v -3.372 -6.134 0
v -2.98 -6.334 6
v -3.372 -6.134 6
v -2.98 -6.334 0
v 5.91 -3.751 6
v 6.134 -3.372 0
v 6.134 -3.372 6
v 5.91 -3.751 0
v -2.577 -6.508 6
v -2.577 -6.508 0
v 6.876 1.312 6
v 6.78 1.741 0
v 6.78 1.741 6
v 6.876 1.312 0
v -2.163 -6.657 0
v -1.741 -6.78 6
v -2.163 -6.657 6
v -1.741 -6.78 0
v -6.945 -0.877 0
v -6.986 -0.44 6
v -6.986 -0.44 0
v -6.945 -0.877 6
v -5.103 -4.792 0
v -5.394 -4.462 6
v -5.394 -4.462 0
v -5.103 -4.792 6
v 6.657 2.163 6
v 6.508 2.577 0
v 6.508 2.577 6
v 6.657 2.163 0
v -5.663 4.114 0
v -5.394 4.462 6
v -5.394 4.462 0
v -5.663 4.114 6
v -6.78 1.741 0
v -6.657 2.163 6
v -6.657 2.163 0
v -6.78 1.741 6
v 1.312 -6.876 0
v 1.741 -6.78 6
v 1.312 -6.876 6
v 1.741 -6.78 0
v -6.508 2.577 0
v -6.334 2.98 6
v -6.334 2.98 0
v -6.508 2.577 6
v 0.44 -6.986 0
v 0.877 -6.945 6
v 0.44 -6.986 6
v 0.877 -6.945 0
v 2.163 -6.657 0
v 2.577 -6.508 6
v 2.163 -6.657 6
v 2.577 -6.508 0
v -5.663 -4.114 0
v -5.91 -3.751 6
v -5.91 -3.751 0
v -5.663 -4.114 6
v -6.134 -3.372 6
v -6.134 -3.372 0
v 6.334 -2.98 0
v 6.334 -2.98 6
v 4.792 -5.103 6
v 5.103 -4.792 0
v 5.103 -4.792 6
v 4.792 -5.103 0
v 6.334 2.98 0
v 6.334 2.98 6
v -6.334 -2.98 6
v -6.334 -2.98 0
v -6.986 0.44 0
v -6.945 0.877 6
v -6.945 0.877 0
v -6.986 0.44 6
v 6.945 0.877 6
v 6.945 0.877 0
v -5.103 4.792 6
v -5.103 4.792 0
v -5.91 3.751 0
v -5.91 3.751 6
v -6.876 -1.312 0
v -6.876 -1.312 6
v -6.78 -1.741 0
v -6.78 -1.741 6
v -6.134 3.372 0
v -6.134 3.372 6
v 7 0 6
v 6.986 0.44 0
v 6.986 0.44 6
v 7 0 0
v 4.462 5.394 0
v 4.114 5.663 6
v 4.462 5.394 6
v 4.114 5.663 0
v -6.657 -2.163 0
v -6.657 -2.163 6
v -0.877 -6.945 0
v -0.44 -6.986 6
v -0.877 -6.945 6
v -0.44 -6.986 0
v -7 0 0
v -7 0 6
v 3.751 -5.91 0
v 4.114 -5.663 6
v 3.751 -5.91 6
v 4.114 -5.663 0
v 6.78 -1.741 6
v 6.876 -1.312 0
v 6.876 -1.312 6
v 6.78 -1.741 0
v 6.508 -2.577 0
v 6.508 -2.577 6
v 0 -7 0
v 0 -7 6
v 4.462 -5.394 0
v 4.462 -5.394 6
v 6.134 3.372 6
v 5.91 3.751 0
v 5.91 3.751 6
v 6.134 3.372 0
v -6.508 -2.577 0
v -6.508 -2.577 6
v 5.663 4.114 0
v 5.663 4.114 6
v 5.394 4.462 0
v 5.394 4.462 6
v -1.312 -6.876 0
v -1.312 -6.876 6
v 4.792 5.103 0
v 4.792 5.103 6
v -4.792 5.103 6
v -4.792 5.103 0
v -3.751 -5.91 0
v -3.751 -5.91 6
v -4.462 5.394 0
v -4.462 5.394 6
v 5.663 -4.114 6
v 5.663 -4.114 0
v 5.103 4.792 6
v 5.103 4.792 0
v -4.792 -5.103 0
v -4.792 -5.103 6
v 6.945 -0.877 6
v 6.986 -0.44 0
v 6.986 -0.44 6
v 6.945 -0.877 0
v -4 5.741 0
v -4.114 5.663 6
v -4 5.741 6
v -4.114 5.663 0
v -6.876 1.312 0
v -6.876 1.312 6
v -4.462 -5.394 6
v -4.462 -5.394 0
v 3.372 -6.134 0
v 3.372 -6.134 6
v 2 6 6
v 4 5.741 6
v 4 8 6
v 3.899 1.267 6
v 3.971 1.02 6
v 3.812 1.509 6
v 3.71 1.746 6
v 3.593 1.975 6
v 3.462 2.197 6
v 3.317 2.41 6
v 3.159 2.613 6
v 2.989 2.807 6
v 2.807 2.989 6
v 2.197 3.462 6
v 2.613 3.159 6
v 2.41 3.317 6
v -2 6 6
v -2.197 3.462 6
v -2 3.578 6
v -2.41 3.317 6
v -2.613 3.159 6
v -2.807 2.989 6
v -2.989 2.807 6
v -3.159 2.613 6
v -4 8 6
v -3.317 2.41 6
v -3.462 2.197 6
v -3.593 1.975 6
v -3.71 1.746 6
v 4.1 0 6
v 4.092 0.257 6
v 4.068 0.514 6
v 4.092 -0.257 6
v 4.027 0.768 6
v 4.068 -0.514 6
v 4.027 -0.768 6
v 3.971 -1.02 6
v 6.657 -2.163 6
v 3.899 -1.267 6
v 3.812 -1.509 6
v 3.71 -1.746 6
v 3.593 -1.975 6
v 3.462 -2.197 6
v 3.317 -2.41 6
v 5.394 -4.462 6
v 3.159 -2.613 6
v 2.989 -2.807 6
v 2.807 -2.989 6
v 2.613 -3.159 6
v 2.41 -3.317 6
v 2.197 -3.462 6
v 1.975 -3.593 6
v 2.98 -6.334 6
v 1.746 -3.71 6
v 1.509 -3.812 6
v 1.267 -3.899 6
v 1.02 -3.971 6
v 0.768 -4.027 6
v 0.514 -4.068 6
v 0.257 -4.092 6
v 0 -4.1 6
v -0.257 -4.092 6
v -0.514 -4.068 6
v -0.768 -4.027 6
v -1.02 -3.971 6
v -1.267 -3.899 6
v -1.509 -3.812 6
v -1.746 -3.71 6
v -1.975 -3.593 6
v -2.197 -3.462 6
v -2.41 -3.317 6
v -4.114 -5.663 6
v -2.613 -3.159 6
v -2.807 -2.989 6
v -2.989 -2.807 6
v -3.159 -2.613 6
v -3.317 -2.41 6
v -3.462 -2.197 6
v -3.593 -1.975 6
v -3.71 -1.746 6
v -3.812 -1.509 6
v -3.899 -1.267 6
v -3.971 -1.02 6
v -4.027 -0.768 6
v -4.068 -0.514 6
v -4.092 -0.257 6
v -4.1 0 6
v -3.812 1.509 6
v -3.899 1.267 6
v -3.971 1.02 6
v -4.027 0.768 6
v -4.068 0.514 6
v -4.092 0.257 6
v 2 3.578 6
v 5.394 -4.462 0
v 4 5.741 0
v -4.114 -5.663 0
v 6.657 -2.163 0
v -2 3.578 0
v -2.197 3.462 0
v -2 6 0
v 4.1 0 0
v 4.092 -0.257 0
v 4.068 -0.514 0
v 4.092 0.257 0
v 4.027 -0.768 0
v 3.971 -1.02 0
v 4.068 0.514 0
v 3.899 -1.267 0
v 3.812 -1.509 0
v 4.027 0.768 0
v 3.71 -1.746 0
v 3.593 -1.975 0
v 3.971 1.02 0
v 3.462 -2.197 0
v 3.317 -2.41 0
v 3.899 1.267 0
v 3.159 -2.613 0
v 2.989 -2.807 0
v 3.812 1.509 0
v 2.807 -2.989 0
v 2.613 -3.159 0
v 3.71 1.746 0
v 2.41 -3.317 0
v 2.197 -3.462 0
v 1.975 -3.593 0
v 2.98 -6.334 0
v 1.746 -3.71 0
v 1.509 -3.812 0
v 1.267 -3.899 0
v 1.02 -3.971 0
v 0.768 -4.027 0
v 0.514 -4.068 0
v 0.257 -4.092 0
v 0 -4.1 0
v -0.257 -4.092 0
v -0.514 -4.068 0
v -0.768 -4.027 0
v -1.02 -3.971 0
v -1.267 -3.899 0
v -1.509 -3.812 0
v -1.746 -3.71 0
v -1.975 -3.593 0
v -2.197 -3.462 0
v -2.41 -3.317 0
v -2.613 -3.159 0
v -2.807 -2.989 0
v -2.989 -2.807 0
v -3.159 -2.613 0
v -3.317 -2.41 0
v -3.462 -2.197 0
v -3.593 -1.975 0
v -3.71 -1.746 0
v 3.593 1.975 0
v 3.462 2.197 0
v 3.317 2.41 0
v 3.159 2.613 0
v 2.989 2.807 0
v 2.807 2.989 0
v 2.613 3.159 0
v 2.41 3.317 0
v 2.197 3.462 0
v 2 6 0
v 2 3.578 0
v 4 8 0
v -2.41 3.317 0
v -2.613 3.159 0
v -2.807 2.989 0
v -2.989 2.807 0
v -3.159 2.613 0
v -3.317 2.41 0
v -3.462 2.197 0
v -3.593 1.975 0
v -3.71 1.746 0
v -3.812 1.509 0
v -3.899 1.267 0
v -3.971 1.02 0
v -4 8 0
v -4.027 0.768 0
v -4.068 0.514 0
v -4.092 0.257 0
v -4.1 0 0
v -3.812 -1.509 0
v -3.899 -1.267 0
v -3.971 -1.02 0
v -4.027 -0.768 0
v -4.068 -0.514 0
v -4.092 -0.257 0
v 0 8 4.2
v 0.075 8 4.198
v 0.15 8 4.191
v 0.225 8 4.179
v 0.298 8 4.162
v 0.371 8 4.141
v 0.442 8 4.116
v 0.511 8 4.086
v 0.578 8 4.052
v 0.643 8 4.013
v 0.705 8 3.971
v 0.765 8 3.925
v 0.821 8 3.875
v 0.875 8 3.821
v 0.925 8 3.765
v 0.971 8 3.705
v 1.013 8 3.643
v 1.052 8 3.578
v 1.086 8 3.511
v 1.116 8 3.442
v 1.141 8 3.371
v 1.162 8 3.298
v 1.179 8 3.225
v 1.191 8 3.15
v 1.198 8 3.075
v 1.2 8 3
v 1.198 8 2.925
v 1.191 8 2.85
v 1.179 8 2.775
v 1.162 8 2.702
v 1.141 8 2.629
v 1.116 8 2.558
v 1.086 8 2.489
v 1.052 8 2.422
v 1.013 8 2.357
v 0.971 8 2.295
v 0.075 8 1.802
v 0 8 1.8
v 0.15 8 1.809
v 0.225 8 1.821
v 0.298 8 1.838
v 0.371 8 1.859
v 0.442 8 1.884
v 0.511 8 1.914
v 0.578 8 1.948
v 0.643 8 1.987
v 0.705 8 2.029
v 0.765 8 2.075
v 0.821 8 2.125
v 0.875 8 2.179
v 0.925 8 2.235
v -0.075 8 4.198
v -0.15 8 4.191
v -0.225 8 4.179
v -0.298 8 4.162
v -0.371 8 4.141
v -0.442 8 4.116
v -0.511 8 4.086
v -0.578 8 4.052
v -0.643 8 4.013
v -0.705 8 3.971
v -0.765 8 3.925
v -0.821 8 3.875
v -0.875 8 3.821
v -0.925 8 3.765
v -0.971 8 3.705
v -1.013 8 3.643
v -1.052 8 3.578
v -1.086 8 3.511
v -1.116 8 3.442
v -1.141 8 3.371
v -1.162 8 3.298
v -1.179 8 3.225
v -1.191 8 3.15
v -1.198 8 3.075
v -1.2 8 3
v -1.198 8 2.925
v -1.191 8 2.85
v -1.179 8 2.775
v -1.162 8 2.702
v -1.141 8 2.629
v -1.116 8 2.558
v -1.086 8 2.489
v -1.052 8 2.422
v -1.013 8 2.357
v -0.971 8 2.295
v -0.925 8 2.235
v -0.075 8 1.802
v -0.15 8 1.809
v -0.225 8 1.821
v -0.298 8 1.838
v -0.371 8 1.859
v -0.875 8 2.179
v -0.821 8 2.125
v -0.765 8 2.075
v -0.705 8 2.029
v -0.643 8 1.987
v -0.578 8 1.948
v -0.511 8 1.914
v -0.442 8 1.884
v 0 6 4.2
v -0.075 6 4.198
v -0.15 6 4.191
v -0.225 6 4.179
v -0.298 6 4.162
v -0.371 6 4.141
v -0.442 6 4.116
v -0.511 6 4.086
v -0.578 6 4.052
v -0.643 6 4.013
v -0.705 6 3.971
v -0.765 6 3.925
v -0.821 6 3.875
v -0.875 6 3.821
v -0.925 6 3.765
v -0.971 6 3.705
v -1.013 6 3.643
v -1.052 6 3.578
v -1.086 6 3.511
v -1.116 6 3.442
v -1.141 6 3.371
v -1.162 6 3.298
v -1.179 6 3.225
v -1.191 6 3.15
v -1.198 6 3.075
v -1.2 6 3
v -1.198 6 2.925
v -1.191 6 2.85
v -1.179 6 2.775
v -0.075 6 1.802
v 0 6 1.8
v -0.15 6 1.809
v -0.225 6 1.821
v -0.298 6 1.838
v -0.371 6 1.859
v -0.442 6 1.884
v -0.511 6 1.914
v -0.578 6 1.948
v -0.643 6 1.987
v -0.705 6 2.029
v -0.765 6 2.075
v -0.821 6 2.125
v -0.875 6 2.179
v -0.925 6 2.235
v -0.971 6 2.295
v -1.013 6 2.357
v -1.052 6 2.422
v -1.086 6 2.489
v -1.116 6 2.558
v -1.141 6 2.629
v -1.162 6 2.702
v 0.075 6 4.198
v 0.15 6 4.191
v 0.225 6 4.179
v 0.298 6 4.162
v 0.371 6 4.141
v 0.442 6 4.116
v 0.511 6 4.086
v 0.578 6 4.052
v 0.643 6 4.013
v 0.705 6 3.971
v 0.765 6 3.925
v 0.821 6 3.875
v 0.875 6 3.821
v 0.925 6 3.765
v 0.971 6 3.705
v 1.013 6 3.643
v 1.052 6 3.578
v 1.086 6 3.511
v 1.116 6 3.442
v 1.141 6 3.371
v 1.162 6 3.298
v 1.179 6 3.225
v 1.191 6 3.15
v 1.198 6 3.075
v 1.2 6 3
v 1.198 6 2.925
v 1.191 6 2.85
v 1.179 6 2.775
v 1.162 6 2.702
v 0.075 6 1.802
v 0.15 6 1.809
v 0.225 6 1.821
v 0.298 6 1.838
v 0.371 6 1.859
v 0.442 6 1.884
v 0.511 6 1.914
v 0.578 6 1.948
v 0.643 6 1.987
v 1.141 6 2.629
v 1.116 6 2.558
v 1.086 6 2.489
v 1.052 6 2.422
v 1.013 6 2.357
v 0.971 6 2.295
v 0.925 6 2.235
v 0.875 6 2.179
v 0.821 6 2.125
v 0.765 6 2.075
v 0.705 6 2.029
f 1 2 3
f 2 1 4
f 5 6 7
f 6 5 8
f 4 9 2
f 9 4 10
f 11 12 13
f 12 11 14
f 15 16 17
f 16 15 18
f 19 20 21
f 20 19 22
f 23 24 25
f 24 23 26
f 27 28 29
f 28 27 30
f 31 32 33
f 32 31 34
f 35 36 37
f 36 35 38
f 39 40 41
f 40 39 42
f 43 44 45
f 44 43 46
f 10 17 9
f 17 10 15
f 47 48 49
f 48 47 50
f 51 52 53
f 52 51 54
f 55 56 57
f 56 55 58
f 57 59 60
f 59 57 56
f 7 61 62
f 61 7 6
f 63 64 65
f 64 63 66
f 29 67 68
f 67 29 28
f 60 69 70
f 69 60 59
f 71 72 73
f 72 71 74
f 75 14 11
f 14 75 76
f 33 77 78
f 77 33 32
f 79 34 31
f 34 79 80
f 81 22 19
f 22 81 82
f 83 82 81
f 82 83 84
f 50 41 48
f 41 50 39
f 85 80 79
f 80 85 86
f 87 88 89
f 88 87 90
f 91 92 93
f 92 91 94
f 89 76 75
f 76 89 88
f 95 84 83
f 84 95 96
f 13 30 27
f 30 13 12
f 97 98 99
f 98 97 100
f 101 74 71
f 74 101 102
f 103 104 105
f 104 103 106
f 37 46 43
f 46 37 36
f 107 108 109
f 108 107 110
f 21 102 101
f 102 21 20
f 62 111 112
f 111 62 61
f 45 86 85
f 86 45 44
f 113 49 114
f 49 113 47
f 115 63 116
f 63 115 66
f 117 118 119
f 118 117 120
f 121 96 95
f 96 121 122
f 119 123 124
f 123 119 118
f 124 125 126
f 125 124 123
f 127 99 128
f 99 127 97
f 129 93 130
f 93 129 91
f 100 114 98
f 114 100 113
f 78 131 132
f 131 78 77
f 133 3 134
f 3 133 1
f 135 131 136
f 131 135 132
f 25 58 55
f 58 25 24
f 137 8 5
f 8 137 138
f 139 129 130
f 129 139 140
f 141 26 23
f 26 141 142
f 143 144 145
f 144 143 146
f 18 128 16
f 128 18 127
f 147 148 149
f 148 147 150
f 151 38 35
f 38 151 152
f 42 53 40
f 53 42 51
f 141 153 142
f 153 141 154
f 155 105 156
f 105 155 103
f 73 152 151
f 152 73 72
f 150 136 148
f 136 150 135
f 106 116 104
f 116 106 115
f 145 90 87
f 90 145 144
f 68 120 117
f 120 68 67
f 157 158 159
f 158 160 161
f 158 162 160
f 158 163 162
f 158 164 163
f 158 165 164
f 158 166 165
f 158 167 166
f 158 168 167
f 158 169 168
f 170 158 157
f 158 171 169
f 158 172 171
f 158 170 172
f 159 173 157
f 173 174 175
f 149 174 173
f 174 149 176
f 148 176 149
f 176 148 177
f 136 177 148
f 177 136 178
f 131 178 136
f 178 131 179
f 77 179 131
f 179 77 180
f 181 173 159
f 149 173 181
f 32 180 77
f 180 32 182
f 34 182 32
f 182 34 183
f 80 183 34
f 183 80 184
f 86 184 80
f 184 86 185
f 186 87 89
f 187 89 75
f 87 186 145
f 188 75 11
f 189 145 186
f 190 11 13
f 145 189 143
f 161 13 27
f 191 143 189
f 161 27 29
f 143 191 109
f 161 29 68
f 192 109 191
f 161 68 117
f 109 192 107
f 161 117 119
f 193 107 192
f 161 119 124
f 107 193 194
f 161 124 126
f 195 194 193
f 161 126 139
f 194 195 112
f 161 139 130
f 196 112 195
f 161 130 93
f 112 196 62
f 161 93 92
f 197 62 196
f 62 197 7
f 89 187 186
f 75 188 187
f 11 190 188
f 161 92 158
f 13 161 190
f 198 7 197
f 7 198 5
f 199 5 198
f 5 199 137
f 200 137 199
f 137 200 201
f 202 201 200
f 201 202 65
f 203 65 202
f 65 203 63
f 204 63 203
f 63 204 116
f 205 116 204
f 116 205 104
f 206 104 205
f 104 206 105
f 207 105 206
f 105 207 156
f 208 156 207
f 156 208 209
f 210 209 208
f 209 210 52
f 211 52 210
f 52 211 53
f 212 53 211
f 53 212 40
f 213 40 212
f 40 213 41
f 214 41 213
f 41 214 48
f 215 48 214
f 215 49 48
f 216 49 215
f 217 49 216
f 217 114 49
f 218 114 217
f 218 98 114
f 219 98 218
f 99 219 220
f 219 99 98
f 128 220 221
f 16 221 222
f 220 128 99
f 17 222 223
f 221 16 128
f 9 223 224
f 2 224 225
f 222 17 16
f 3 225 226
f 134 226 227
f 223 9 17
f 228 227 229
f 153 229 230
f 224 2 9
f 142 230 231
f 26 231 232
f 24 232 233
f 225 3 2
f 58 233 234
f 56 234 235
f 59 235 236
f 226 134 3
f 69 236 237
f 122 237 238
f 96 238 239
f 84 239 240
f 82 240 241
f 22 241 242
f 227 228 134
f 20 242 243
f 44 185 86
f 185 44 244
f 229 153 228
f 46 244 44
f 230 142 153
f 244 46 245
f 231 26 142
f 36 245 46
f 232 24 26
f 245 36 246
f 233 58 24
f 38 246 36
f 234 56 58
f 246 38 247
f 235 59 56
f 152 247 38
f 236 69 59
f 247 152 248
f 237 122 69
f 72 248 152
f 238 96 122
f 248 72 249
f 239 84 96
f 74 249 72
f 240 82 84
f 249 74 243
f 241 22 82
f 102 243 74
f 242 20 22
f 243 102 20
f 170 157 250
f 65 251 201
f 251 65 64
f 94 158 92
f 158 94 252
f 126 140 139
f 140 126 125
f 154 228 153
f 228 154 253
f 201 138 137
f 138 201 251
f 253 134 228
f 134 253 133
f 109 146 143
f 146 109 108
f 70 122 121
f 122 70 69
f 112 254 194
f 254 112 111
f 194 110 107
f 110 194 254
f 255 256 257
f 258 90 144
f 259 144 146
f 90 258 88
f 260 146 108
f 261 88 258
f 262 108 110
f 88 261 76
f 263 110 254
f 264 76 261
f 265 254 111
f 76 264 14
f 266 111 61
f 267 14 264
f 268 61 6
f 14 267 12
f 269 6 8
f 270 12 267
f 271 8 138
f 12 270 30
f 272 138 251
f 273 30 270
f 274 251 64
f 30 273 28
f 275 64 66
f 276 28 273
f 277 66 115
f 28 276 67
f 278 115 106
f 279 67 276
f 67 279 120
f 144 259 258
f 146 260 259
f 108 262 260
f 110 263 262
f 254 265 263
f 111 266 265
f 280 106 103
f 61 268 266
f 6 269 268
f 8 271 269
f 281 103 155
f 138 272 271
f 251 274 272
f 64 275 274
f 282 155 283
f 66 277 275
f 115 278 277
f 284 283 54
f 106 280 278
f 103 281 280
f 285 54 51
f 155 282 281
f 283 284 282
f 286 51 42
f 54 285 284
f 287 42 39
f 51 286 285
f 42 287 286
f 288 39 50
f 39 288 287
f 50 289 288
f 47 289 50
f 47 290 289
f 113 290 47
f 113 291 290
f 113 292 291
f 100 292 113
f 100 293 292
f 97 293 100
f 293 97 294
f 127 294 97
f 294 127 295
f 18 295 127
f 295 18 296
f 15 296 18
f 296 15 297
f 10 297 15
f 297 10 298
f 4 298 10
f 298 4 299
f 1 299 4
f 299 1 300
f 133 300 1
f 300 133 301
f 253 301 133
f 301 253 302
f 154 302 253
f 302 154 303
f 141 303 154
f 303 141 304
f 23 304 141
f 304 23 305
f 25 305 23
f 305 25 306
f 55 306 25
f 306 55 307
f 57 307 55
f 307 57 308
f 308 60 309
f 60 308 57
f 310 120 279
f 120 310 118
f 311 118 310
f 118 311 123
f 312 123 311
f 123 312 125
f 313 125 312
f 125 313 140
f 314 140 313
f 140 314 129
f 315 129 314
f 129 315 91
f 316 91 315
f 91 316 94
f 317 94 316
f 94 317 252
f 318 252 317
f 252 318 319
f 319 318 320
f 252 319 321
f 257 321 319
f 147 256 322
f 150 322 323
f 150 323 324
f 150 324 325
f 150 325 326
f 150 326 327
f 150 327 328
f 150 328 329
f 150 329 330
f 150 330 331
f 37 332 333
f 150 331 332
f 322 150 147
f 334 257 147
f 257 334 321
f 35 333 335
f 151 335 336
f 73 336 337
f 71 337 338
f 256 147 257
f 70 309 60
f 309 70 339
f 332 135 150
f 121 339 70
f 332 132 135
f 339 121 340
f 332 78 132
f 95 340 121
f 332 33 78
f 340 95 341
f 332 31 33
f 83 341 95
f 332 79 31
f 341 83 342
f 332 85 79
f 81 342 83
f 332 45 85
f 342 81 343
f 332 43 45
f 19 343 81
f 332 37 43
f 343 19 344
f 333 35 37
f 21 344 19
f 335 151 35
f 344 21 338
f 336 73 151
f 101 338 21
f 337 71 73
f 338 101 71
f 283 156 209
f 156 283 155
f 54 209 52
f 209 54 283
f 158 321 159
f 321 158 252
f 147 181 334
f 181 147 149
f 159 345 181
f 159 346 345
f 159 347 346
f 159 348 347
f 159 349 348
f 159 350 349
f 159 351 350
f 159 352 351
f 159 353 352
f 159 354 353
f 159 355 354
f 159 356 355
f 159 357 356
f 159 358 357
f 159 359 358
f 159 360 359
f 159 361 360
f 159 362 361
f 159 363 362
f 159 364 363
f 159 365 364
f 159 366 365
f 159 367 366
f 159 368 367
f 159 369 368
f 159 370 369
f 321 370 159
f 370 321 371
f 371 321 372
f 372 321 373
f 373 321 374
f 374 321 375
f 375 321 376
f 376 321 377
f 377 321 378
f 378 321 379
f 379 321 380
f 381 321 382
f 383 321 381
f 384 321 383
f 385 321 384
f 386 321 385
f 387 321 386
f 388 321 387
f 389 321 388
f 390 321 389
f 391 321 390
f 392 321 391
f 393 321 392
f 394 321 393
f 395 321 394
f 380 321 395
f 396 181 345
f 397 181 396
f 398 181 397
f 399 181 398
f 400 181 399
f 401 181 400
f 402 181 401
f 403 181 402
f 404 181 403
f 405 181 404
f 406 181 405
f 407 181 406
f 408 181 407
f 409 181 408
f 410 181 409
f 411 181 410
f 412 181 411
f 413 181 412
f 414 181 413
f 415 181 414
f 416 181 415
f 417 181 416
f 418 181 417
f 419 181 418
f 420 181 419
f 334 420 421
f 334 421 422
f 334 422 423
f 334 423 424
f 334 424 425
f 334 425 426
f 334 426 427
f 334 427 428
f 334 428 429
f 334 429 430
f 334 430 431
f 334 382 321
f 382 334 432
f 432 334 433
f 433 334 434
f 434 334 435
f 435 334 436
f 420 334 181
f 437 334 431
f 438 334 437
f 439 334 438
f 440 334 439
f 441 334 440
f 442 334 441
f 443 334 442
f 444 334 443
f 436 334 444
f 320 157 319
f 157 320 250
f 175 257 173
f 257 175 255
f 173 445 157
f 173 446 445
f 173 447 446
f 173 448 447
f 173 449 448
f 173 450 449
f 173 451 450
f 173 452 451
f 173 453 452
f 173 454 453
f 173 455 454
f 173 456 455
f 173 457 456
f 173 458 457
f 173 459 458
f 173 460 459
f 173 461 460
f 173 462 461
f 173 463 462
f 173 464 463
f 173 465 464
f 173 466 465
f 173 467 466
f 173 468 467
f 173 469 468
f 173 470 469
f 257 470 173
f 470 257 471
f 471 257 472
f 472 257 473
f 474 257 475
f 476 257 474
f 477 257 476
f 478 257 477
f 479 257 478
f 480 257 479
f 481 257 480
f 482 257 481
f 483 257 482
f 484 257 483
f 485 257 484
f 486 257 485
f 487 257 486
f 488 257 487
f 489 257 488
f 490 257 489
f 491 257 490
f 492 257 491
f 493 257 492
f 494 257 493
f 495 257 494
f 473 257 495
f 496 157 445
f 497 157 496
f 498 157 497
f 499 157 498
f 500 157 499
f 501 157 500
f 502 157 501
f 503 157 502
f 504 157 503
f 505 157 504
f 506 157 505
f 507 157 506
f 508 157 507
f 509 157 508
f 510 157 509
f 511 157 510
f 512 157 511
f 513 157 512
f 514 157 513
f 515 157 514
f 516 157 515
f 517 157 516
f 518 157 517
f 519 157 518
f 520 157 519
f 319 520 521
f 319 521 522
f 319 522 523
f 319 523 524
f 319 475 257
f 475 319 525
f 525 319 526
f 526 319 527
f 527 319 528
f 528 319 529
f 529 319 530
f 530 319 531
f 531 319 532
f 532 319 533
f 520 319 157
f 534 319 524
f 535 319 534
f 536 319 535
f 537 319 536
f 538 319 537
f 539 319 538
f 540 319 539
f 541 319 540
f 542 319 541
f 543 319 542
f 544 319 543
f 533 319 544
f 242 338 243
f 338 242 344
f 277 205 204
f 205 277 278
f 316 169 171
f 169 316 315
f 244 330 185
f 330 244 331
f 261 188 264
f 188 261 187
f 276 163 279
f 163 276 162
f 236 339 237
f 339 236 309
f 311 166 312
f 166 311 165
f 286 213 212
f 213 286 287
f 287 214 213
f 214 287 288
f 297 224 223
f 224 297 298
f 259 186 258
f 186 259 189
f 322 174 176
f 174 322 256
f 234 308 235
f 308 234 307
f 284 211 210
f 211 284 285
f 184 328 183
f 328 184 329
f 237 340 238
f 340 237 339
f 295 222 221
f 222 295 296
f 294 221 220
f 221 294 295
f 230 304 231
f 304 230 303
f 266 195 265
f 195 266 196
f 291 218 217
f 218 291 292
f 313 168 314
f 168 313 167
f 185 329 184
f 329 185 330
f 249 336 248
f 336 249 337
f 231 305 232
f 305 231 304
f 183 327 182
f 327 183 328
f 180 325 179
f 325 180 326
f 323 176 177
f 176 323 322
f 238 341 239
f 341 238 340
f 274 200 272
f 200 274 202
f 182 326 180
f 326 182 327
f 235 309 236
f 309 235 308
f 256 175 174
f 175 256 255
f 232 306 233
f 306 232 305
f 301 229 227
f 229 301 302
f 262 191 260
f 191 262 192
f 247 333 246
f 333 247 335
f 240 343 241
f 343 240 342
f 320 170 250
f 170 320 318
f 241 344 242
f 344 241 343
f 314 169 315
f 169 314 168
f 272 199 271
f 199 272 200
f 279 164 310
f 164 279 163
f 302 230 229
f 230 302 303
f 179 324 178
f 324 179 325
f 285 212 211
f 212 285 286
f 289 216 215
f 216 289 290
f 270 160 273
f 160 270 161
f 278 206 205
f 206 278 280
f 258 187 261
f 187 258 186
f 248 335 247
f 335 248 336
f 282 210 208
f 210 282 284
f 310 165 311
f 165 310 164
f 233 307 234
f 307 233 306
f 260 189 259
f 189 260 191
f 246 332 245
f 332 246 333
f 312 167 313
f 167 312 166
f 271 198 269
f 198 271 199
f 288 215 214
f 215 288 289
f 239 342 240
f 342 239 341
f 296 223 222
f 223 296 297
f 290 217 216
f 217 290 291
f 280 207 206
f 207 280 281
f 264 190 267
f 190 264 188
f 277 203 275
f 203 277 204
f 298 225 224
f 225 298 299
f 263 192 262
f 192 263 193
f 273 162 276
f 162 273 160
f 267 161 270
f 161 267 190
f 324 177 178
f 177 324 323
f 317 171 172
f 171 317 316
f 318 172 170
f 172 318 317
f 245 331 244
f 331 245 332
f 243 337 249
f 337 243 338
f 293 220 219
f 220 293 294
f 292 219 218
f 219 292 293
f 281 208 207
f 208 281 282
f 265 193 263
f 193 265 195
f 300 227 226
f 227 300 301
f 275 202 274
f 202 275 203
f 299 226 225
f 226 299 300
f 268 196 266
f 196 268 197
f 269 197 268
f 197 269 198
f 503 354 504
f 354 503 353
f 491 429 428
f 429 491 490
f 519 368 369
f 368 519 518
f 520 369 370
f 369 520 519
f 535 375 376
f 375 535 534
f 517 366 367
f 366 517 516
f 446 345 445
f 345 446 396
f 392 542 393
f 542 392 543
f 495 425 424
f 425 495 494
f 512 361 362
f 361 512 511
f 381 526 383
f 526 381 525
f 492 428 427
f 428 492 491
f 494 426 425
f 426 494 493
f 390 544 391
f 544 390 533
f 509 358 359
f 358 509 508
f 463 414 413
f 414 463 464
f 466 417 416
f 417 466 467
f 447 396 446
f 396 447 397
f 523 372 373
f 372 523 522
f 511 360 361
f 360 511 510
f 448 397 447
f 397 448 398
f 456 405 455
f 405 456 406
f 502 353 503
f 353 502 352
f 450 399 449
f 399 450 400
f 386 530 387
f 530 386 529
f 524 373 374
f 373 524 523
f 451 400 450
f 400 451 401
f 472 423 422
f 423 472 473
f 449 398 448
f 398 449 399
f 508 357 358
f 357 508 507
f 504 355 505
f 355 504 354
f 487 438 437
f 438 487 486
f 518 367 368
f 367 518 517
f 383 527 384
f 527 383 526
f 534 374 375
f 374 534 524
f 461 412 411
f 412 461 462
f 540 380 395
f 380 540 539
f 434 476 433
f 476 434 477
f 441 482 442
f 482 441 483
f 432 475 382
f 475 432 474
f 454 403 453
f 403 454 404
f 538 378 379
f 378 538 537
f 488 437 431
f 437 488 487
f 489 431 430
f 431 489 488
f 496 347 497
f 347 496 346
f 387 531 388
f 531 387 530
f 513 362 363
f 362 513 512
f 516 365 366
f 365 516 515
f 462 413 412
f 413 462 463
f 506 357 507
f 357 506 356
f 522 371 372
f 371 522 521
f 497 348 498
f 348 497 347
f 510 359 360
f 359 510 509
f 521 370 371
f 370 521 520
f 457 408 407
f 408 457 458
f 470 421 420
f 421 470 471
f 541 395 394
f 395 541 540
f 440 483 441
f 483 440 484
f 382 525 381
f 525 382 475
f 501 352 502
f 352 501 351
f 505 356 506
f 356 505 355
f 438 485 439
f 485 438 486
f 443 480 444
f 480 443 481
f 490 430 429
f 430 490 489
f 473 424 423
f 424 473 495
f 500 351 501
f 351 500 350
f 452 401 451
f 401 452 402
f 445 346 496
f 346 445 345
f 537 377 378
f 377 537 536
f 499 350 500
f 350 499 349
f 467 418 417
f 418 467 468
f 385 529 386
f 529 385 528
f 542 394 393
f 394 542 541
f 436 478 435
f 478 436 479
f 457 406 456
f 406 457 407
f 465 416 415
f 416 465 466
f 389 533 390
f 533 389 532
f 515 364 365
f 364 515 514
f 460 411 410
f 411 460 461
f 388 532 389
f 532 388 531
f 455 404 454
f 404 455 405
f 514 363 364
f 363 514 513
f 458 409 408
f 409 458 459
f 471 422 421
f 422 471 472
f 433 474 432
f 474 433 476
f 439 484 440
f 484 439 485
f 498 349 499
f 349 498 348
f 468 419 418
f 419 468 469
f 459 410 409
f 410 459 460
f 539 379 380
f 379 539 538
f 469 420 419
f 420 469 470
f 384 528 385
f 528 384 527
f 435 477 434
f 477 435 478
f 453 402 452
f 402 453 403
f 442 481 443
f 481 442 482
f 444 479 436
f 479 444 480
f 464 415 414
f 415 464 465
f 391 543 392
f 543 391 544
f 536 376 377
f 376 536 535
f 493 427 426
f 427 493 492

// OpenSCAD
        difference(){
            union(){

                translate([0,0,0]){
                    rotate([0,0,90]){
                        cylinder(h=6, r=7, $fn=100, center=false);
                    }
            }  
                translate([-4,4,0]){
                    cube([8,4,6], center=false);
                }      

            }
            union() {
                translate([-2,3,-1]){
                    cube([4,3,20], center=false);
                }      
                translate([0,0,-1]){
                    rotate([0,0,90]){
                        cylinder(h=33, r=4.1, $fn=100, center=false);
                    }
                }  
                translate([0,10,3]){
                    rotate([90,0,0]){
                        cylinder(h=10, r=1.2, $fn=100, center=false);
                    }
                }  


            }
        }
